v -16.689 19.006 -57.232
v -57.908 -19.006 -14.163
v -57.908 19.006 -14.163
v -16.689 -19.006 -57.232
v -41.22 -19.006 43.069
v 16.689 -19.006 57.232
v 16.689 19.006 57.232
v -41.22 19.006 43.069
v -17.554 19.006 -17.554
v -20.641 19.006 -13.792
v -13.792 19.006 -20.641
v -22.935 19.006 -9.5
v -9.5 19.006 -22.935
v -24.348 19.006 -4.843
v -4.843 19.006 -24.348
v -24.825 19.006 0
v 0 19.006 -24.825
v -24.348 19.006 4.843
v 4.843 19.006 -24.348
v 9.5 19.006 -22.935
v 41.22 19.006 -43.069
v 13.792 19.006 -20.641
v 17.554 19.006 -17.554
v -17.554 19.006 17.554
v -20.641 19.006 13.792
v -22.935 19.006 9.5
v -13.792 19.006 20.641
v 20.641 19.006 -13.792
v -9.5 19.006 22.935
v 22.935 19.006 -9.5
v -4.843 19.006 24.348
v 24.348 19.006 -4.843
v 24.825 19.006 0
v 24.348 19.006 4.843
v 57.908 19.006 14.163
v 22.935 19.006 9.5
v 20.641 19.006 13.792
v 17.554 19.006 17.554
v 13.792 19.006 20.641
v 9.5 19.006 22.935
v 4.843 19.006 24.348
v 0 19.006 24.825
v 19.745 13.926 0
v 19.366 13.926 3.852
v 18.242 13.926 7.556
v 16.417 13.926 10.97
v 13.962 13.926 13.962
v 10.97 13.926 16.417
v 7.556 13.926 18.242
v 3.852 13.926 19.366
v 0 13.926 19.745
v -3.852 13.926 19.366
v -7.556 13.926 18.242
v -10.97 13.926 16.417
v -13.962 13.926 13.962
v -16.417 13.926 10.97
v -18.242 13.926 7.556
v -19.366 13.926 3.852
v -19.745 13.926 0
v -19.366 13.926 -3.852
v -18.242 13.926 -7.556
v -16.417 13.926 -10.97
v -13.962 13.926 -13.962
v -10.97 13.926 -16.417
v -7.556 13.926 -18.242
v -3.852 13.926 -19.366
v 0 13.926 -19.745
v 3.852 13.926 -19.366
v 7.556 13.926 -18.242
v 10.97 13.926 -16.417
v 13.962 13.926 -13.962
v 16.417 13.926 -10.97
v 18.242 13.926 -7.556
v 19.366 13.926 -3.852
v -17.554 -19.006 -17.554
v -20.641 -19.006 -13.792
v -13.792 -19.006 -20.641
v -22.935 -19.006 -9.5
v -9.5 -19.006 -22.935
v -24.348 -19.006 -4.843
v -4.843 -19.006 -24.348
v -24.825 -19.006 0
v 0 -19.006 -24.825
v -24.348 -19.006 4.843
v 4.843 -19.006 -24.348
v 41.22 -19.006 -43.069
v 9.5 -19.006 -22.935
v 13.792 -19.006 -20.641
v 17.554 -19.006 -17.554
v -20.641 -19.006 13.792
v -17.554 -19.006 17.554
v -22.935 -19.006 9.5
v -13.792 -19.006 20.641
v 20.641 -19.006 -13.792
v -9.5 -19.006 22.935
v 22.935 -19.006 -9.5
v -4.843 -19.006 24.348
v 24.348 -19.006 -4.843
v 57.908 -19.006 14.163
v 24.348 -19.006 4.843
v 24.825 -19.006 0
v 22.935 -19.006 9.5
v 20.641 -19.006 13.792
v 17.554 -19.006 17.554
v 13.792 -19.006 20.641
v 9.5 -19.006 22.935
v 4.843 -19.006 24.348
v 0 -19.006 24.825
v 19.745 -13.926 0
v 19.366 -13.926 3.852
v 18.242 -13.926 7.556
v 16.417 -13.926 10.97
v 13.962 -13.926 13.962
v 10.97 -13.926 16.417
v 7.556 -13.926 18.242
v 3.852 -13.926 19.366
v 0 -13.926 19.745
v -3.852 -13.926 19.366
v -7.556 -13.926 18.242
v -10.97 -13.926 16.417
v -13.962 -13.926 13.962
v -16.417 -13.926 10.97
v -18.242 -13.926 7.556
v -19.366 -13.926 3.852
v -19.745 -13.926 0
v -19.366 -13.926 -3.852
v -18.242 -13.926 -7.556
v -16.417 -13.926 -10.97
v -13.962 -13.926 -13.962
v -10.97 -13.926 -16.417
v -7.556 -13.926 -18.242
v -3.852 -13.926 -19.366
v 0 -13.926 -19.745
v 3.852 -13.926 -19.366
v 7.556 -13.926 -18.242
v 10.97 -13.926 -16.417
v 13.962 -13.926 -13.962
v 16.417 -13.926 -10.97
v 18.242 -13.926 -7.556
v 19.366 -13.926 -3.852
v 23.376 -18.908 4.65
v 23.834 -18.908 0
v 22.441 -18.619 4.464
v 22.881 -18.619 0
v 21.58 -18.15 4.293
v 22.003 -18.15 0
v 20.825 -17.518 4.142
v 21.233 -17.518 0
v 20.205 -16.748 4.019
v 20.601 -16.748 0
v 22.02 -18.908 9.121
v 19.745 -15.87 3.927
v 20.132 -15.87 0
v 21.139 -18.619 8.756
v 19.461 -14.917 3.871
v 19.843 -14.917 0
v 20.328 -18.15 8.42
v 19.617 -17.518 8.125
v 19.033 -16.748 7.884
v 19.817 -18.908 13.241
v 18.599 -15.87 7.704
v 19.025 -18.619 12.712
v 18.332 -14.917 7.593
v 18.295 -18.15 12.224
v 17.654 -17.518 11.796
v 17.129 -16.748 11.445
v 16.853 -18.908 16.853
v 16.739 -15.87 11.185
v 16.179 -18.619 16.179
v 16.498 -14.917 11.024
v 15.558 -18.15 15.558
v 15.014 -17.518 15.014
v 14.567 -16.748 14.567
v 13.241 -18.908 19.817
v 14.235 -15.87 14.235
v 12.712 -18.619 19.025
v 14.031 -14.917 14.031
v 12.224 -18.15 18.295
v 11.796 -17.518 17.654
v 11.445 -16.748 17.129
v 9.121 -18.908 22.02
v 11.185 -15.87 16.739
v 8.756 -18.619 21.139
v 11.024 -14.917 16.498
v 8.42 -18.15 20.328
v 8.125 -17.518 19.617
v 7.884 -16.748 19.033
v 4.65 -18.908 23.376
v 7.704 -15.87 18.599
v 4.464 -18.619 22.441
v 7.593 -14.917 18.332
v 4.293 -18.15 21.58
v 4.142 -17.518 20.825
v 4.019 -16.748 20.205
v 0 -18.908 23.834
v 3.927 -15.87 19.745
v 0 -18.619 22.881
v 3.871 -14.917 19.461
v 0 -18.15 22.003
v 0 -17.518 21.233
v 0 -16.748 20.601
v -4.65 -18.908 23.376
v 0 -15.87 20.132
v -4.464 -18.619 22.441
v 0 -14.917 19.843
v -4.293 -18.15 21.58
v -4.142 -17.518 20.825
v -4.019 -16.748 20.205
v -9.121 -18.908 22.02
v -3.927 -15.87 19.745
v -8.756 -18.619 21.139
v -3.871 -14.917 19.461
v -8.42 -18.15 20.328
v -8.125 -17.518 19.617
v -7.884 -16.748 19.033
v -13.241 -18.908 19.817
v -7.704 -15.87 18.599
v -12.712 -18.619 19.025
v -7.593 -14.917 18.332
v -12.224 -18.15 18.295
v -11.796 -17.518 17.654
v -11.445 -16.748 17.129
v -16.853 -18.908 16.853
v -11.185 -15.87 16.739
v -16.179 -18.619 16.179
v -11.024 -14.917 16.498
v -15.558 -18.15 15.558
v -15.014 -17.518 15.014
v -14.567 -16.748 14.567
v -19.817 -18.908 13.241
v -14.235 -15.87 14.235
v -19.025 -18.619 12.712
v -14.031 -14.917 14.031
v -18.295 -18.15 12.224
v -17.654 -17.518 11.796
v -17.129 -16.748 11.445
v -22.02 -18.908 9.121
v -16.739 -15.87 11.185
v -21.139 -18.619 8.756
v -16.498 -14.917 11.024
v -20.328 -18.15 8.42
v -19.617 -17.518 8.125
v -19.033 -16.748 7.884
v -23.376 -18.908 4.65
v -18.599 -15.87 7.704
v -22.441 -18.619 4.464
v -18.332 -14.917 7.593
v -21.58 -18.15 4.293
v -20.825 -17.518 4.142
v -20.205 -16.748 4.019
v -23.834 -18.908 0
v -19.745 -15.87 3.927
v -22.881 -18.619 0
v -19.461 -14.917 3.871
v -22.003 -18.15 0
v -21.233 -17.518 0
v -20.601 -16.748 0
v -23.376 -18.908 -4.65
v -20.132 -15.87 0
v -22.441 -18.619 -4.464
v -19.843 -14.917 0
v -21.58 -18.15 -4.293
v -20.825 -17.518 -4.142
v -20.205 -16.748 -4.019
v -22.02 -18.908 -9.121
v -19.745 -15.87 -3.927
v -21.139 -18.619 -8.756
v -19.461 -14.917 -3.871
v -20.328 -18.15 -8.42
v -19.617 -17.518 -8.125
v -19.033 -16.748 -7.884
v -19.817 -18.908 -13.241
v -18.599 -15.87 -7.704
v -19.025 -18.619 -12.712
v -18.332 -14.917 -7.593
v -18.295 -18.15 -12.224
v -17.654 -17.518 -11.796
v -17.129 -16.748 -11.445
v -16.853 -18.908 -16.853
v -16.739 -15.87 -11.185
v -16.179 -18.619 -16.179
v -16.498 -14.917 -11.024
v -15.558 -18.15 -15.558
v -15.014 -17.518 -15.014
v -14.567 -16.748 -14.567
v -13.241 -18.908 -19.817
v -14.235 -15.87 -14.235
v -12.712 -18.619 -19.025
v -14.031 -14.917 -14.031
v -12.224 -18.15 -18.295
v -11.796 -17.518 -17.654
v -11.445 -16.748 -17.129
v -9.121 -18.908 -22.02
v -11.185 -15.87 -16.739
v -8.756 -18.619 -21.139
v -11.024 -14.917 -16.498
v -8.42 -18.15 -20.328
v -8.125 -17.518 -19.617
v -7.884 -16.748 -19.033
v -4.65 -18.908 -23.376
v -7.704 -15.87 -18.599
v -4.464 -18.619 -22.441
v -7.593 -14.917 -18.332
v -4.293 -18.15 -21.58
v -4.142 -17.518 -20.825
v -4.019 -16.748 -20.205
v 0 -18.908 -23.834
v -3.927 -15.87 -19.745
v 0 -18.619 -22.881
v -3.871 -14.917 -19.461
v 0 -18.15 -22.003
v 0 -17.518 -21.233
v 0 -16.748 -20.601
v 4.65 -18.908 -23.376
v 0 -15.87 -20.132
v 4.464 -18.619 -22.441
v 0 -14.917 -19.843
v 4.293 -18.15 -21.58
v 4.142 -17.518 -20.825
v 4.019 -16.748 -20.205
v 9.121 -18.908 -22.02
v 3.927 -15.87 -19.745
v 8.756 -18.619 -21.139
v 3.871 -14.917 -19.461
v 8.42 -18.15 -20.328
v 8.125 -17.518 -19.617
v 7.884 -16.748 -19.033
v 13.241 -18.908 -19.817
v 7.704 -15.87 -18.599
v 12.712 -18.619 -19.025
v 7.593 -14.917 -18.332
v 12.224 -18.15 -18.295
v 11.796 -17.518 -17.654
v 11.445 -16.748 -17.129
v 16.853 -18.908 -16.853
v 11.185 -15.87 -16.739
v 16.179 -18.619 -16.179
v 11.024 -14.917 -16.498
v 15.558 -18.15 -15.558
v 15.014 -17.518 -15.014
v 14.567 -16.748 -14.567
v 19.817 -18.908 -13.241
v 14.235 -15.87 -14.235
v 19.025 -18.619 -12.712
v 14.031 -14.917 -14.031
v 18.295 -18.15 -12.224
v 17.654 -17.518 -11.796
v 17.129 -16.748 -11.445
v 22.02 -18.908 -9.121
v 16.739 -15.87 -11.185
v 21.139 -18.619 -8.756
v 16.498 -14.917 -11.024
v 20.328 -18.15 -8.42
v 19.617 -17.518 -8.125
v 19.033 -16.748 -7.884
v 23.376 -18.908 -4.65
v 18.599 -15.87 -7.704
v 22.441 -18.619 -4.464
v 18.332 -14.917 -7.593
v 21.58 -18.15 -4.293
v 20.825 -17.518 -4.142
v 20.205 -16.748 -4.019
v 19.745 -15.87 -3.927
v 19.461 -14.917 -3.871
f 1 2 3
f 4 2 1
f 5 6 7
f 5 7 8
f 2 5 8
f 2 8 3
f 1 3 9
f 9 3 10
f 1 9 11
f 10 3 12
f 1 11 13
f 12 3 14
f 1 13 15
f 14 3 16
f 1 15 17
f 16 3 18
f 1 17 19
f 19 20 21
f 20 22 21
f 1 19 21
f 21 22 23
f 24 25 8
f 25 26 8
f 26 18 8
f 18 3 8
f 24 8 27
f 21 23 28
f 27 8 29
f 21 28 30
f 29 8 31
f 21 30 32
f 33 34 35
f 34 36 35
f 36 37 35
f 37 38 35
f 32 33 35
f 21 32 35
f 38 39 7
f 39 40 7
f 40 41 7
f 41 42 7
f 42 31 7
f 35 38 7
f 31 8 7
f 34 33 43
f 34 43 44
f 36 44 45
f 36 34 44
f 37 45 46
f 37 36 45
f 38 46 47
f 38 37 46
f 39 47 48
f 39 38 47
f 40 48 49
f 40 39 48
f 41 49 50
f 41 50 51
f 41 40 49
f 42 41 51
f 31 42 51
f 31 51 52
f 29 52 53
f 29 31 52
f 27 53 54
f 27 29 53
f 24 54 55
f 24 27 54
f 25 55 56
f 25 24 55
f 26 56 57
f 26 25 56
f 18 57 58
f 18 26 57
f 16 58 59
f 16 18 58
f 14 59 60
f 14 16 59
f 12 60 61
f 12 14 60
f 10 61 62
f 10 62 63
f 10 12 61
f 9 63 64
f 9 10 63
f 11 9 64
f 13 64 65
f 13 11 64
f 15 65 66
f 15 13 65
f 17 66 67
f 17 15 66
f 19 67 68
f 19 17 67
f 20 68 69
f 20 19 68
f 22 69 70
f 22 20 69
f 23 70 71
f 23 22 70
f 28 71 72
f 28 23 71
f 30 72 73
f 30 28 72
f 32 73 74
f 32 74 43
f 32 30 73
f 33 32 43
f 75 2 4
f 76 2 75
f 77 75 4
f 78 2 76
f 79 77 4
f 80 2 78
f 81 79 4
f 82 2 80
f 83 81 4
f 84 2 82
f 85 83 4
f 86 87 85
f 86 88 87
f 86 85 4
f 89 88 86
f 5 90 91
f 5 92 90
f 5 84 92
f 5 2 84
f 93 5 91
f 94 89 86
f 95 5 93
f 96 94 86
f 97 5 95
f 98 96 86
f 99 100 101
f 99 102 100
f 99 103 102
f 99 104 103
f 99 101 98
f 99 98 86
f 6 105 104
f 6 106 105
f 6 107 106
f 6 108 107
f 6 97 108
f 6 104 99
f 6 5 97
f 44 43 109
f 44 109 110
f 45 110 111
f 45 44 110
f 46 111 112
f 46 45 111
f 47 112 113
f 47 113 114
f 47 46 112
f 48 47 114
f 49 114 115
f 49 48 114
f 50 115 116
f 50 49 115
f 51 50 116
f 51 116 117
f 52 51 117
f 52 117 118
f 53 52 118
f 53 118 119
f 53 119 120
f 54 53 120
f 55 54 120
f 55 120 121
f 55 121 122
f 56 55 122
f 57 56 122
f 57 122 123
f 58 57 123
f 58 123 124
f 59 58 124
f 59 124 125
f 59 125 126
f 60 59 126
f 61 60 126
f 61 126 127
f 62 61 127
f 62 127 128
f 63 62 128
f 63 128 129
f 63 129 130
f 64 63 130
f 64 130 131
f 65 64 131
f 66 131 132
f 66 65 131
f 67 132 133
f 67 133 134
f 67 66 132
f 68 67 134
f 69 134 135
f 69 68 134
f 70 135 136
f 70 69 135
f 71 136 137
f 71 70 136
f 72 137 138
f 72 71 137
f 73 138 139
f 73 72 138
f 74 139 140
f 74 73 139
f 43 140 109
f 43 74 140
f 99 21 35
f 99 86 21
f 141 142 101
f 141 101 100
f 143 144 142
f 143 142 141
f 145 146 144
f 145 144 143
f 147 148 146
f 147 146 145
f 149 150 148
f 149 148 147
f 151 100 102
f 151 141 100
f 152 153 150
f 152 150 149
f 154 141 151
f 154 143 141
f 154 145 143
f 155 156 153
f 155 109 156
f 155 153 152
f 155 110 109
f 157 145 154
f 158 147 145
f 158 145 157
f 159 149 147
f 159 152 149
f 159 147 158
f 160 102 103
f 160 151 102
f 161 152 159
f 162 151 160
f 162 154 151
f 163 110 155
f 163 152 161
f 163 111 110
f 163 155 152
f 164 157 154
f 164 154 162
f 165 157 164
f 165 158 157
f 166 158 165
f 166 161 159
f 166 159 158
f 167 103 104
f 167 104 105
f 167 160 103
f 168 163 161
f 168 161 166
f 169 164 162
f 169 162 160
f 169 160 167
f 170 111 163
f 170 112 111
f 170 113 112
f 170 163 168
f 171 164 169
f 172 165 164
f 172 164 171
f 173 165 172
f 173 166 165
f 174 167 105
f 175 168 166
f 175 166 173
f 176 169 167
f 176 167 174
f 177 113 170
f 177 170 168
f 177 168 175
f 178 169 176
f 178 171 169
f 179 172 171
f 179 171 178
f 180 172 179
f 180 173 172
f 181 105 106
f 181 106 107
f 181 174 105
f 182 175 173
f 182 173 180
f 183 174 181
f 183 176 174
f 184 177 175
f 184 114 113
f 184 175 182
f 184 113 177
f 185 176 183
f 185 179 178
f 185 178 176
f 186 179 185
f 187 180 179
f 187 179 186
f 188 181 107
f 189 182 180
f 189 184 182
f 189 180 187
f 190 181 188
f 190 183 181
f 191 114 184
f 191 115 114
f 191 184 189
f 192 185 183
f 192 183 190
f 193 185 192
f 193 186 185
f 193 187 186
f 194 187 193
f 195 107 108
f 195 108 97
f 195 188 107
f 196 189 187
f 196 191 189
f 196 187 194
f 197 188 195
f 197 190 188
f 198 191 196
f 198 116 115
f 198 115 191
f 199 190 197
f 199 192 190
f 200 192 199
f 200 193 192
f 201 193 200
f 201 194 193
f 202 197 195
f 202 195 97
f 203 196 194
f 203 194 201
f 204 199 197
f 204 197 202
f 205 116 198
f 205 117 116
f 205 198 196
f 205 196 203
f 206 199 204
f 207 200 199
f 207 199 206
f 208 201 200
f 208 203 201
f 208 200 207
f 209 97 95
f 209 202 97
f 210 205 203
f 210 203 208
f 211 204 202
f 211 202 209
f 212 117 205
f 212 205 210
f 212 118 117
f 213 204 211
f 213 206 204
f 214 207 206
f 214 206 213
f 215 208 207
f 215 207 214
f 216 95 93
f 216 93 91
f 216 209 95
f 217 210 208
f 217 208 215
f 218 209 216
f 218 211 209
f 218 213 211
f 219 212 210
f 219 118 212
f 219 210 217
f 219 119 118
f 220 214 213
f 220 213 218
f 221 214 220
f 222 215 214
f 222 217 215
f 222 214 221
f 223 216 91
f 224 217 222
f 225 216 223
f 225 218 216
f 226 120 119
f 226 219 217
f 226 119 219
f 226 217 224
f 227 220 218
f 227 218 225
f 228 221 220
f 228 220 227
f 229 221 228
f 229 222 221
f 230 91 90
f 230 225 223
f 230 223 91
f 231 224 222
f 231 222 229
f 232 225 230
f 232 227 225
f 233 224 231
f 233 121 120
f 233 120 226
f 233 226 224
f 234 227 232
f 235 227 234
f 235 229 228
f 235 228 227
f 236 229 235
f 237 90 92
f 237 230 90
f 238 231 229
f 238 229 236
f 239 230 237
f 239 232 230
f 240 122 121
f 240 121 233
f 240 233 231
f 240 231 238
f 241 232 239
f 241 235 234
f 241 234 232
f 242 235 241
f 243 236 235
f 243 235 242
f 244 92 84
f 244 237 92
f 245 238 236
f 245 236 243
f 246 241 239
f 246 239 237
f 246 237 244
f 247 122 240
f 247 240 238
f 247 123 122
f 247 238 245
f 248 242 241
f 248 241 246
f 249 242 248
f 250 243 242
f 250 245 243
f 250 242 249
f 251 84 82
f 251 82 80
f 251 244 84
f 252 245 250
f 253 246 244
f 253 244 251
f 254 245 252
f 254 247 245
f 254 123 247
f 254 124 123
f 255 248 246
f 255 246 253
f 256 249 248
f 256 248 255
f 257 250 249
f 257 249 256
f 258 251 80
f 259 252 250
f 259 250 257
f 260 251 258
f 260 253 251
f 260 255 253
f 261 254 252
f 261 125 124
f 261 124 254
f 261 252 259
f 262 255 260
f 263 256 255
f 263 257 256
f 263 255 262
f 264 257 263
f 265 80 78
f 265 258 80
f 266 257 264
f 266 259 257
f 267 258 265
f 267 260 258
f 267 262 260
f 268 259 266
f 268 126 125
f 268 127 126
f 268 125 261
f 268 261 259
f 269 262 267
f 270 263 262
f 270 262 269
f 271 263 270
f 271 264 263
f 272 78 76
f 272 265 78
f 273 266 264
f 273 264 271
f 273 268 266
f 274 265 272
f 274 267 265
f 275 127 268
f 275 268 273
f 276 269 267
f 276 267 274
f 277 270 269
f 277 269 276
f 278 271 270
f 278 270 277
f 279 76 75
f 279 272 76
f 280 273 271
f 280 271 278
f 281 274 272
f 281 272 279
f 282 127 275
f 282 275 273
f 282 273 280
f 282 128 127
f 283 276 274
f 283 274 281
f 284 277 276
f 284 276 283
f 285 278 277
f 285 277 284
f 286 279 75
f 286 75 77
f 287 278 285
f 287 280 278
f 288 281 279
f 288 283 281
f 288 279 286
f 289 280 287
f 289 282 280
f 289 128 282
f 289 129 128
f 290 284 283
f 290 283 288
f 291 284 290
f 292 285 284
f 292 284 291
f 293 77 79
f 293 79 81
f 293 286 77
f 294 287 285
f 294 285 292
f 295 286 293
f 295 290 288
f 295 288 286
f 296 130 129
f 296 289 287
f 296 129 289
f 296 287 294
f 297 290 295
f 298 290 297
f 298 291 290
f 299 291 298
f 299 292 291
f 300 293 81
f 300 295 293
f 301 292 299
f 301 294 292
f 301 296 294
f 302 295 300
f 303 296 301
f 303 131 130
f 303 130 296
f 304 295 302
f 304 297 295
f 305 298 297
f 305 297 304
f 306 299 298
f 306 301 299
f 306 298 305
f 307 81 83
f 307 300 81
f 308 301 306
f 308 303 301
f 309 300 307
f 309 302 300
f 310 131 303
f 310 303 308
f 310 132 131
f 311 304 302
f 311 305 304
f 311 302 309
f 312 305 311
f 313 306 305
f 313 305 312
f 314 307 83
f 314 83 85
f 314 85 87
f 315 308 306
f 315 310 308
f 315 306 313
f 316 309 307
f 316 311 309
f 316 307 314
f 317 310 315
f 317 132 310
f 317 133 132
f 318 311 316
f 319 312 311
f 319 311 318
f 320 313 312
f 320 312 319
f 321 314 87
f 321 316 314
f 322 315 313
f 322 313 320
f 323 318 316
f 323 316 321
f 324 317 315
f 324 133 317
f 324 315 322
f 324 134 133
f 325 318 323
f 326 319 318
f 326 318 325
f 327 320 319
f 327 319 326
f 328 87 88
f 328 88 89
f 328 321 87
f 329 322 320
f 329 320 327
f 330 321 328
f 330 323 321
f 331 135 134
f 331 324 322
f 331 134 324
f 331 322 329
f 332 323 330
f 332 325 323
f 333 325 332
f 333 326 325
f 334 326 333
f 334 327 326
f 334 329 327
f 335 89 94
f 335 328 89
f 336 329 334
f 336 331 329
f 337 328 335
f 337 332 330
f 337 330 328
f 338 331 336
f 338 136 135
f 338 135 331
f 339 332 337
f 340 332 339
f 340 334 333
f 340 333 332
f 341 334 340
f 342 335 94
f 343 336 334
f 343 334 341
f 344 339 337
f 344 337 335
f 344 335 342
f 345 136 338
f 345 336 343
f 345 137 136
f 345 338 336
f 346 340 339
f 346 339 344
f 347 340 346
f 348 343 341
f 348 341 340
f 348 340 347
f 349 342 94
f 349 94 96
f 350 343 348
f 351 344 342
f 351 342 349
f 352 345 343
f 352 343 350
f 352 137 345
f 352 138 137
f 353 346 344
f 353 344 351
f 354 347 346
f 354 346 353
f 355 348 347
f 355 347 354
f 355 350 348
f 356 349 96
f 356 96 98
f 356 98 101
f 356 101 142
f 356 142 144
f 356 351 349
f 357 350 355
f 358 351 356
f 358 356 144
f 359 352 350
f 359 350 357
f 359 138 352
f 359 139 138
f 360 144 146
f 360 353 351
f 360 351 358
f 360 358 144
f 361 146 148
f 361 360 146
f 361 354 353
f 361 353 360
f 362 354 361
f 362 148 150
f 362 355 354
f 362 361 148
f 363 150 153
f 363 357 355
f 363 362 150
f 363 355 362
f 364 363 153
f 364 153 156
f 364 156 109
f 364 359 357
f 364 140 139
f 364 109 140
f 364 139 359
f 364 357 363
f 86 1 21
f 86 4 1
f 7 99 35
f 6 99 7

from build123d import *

# Parameters (mm, degrees)
F0_R     = 19.744958
F1_DEPTH = 19.005943
F2_R     = 5.08
F3_SIZE  = 5.08


with BuildPart() as f1:
    # F0 (on Front) → F1 (new body, symmetric)
    with BuildSketch(Plane.XZ):
        Polygon((41.21972, -43.068756), (57.908497, 14.162947), (16.688777, 57.231702), (-41.21972, 43.068756), (-57.908497, -14.162947), (-16.688777, -57.231702), align=None)
        Circle(F0_R, mode=Mode.SUBTRACT)
    extrude(amount=F1_DEPTH, both=True)

    # F2
    f2_edges = [f1.edges().sort_by_distance(p)[0] for p in [
        (-19.744958, -19.005943, 0),
    ]]
    fillet(f2_edges, radius=F2_R)

    # F3
    f3_edges = [f1.edges().sort_by_distance(p)[0] for p in [
        (-19.744958, 19.005943, 0),
    ]]
    chamfer(f3_edges, length=F3_SIZE)


solid = f1.part
